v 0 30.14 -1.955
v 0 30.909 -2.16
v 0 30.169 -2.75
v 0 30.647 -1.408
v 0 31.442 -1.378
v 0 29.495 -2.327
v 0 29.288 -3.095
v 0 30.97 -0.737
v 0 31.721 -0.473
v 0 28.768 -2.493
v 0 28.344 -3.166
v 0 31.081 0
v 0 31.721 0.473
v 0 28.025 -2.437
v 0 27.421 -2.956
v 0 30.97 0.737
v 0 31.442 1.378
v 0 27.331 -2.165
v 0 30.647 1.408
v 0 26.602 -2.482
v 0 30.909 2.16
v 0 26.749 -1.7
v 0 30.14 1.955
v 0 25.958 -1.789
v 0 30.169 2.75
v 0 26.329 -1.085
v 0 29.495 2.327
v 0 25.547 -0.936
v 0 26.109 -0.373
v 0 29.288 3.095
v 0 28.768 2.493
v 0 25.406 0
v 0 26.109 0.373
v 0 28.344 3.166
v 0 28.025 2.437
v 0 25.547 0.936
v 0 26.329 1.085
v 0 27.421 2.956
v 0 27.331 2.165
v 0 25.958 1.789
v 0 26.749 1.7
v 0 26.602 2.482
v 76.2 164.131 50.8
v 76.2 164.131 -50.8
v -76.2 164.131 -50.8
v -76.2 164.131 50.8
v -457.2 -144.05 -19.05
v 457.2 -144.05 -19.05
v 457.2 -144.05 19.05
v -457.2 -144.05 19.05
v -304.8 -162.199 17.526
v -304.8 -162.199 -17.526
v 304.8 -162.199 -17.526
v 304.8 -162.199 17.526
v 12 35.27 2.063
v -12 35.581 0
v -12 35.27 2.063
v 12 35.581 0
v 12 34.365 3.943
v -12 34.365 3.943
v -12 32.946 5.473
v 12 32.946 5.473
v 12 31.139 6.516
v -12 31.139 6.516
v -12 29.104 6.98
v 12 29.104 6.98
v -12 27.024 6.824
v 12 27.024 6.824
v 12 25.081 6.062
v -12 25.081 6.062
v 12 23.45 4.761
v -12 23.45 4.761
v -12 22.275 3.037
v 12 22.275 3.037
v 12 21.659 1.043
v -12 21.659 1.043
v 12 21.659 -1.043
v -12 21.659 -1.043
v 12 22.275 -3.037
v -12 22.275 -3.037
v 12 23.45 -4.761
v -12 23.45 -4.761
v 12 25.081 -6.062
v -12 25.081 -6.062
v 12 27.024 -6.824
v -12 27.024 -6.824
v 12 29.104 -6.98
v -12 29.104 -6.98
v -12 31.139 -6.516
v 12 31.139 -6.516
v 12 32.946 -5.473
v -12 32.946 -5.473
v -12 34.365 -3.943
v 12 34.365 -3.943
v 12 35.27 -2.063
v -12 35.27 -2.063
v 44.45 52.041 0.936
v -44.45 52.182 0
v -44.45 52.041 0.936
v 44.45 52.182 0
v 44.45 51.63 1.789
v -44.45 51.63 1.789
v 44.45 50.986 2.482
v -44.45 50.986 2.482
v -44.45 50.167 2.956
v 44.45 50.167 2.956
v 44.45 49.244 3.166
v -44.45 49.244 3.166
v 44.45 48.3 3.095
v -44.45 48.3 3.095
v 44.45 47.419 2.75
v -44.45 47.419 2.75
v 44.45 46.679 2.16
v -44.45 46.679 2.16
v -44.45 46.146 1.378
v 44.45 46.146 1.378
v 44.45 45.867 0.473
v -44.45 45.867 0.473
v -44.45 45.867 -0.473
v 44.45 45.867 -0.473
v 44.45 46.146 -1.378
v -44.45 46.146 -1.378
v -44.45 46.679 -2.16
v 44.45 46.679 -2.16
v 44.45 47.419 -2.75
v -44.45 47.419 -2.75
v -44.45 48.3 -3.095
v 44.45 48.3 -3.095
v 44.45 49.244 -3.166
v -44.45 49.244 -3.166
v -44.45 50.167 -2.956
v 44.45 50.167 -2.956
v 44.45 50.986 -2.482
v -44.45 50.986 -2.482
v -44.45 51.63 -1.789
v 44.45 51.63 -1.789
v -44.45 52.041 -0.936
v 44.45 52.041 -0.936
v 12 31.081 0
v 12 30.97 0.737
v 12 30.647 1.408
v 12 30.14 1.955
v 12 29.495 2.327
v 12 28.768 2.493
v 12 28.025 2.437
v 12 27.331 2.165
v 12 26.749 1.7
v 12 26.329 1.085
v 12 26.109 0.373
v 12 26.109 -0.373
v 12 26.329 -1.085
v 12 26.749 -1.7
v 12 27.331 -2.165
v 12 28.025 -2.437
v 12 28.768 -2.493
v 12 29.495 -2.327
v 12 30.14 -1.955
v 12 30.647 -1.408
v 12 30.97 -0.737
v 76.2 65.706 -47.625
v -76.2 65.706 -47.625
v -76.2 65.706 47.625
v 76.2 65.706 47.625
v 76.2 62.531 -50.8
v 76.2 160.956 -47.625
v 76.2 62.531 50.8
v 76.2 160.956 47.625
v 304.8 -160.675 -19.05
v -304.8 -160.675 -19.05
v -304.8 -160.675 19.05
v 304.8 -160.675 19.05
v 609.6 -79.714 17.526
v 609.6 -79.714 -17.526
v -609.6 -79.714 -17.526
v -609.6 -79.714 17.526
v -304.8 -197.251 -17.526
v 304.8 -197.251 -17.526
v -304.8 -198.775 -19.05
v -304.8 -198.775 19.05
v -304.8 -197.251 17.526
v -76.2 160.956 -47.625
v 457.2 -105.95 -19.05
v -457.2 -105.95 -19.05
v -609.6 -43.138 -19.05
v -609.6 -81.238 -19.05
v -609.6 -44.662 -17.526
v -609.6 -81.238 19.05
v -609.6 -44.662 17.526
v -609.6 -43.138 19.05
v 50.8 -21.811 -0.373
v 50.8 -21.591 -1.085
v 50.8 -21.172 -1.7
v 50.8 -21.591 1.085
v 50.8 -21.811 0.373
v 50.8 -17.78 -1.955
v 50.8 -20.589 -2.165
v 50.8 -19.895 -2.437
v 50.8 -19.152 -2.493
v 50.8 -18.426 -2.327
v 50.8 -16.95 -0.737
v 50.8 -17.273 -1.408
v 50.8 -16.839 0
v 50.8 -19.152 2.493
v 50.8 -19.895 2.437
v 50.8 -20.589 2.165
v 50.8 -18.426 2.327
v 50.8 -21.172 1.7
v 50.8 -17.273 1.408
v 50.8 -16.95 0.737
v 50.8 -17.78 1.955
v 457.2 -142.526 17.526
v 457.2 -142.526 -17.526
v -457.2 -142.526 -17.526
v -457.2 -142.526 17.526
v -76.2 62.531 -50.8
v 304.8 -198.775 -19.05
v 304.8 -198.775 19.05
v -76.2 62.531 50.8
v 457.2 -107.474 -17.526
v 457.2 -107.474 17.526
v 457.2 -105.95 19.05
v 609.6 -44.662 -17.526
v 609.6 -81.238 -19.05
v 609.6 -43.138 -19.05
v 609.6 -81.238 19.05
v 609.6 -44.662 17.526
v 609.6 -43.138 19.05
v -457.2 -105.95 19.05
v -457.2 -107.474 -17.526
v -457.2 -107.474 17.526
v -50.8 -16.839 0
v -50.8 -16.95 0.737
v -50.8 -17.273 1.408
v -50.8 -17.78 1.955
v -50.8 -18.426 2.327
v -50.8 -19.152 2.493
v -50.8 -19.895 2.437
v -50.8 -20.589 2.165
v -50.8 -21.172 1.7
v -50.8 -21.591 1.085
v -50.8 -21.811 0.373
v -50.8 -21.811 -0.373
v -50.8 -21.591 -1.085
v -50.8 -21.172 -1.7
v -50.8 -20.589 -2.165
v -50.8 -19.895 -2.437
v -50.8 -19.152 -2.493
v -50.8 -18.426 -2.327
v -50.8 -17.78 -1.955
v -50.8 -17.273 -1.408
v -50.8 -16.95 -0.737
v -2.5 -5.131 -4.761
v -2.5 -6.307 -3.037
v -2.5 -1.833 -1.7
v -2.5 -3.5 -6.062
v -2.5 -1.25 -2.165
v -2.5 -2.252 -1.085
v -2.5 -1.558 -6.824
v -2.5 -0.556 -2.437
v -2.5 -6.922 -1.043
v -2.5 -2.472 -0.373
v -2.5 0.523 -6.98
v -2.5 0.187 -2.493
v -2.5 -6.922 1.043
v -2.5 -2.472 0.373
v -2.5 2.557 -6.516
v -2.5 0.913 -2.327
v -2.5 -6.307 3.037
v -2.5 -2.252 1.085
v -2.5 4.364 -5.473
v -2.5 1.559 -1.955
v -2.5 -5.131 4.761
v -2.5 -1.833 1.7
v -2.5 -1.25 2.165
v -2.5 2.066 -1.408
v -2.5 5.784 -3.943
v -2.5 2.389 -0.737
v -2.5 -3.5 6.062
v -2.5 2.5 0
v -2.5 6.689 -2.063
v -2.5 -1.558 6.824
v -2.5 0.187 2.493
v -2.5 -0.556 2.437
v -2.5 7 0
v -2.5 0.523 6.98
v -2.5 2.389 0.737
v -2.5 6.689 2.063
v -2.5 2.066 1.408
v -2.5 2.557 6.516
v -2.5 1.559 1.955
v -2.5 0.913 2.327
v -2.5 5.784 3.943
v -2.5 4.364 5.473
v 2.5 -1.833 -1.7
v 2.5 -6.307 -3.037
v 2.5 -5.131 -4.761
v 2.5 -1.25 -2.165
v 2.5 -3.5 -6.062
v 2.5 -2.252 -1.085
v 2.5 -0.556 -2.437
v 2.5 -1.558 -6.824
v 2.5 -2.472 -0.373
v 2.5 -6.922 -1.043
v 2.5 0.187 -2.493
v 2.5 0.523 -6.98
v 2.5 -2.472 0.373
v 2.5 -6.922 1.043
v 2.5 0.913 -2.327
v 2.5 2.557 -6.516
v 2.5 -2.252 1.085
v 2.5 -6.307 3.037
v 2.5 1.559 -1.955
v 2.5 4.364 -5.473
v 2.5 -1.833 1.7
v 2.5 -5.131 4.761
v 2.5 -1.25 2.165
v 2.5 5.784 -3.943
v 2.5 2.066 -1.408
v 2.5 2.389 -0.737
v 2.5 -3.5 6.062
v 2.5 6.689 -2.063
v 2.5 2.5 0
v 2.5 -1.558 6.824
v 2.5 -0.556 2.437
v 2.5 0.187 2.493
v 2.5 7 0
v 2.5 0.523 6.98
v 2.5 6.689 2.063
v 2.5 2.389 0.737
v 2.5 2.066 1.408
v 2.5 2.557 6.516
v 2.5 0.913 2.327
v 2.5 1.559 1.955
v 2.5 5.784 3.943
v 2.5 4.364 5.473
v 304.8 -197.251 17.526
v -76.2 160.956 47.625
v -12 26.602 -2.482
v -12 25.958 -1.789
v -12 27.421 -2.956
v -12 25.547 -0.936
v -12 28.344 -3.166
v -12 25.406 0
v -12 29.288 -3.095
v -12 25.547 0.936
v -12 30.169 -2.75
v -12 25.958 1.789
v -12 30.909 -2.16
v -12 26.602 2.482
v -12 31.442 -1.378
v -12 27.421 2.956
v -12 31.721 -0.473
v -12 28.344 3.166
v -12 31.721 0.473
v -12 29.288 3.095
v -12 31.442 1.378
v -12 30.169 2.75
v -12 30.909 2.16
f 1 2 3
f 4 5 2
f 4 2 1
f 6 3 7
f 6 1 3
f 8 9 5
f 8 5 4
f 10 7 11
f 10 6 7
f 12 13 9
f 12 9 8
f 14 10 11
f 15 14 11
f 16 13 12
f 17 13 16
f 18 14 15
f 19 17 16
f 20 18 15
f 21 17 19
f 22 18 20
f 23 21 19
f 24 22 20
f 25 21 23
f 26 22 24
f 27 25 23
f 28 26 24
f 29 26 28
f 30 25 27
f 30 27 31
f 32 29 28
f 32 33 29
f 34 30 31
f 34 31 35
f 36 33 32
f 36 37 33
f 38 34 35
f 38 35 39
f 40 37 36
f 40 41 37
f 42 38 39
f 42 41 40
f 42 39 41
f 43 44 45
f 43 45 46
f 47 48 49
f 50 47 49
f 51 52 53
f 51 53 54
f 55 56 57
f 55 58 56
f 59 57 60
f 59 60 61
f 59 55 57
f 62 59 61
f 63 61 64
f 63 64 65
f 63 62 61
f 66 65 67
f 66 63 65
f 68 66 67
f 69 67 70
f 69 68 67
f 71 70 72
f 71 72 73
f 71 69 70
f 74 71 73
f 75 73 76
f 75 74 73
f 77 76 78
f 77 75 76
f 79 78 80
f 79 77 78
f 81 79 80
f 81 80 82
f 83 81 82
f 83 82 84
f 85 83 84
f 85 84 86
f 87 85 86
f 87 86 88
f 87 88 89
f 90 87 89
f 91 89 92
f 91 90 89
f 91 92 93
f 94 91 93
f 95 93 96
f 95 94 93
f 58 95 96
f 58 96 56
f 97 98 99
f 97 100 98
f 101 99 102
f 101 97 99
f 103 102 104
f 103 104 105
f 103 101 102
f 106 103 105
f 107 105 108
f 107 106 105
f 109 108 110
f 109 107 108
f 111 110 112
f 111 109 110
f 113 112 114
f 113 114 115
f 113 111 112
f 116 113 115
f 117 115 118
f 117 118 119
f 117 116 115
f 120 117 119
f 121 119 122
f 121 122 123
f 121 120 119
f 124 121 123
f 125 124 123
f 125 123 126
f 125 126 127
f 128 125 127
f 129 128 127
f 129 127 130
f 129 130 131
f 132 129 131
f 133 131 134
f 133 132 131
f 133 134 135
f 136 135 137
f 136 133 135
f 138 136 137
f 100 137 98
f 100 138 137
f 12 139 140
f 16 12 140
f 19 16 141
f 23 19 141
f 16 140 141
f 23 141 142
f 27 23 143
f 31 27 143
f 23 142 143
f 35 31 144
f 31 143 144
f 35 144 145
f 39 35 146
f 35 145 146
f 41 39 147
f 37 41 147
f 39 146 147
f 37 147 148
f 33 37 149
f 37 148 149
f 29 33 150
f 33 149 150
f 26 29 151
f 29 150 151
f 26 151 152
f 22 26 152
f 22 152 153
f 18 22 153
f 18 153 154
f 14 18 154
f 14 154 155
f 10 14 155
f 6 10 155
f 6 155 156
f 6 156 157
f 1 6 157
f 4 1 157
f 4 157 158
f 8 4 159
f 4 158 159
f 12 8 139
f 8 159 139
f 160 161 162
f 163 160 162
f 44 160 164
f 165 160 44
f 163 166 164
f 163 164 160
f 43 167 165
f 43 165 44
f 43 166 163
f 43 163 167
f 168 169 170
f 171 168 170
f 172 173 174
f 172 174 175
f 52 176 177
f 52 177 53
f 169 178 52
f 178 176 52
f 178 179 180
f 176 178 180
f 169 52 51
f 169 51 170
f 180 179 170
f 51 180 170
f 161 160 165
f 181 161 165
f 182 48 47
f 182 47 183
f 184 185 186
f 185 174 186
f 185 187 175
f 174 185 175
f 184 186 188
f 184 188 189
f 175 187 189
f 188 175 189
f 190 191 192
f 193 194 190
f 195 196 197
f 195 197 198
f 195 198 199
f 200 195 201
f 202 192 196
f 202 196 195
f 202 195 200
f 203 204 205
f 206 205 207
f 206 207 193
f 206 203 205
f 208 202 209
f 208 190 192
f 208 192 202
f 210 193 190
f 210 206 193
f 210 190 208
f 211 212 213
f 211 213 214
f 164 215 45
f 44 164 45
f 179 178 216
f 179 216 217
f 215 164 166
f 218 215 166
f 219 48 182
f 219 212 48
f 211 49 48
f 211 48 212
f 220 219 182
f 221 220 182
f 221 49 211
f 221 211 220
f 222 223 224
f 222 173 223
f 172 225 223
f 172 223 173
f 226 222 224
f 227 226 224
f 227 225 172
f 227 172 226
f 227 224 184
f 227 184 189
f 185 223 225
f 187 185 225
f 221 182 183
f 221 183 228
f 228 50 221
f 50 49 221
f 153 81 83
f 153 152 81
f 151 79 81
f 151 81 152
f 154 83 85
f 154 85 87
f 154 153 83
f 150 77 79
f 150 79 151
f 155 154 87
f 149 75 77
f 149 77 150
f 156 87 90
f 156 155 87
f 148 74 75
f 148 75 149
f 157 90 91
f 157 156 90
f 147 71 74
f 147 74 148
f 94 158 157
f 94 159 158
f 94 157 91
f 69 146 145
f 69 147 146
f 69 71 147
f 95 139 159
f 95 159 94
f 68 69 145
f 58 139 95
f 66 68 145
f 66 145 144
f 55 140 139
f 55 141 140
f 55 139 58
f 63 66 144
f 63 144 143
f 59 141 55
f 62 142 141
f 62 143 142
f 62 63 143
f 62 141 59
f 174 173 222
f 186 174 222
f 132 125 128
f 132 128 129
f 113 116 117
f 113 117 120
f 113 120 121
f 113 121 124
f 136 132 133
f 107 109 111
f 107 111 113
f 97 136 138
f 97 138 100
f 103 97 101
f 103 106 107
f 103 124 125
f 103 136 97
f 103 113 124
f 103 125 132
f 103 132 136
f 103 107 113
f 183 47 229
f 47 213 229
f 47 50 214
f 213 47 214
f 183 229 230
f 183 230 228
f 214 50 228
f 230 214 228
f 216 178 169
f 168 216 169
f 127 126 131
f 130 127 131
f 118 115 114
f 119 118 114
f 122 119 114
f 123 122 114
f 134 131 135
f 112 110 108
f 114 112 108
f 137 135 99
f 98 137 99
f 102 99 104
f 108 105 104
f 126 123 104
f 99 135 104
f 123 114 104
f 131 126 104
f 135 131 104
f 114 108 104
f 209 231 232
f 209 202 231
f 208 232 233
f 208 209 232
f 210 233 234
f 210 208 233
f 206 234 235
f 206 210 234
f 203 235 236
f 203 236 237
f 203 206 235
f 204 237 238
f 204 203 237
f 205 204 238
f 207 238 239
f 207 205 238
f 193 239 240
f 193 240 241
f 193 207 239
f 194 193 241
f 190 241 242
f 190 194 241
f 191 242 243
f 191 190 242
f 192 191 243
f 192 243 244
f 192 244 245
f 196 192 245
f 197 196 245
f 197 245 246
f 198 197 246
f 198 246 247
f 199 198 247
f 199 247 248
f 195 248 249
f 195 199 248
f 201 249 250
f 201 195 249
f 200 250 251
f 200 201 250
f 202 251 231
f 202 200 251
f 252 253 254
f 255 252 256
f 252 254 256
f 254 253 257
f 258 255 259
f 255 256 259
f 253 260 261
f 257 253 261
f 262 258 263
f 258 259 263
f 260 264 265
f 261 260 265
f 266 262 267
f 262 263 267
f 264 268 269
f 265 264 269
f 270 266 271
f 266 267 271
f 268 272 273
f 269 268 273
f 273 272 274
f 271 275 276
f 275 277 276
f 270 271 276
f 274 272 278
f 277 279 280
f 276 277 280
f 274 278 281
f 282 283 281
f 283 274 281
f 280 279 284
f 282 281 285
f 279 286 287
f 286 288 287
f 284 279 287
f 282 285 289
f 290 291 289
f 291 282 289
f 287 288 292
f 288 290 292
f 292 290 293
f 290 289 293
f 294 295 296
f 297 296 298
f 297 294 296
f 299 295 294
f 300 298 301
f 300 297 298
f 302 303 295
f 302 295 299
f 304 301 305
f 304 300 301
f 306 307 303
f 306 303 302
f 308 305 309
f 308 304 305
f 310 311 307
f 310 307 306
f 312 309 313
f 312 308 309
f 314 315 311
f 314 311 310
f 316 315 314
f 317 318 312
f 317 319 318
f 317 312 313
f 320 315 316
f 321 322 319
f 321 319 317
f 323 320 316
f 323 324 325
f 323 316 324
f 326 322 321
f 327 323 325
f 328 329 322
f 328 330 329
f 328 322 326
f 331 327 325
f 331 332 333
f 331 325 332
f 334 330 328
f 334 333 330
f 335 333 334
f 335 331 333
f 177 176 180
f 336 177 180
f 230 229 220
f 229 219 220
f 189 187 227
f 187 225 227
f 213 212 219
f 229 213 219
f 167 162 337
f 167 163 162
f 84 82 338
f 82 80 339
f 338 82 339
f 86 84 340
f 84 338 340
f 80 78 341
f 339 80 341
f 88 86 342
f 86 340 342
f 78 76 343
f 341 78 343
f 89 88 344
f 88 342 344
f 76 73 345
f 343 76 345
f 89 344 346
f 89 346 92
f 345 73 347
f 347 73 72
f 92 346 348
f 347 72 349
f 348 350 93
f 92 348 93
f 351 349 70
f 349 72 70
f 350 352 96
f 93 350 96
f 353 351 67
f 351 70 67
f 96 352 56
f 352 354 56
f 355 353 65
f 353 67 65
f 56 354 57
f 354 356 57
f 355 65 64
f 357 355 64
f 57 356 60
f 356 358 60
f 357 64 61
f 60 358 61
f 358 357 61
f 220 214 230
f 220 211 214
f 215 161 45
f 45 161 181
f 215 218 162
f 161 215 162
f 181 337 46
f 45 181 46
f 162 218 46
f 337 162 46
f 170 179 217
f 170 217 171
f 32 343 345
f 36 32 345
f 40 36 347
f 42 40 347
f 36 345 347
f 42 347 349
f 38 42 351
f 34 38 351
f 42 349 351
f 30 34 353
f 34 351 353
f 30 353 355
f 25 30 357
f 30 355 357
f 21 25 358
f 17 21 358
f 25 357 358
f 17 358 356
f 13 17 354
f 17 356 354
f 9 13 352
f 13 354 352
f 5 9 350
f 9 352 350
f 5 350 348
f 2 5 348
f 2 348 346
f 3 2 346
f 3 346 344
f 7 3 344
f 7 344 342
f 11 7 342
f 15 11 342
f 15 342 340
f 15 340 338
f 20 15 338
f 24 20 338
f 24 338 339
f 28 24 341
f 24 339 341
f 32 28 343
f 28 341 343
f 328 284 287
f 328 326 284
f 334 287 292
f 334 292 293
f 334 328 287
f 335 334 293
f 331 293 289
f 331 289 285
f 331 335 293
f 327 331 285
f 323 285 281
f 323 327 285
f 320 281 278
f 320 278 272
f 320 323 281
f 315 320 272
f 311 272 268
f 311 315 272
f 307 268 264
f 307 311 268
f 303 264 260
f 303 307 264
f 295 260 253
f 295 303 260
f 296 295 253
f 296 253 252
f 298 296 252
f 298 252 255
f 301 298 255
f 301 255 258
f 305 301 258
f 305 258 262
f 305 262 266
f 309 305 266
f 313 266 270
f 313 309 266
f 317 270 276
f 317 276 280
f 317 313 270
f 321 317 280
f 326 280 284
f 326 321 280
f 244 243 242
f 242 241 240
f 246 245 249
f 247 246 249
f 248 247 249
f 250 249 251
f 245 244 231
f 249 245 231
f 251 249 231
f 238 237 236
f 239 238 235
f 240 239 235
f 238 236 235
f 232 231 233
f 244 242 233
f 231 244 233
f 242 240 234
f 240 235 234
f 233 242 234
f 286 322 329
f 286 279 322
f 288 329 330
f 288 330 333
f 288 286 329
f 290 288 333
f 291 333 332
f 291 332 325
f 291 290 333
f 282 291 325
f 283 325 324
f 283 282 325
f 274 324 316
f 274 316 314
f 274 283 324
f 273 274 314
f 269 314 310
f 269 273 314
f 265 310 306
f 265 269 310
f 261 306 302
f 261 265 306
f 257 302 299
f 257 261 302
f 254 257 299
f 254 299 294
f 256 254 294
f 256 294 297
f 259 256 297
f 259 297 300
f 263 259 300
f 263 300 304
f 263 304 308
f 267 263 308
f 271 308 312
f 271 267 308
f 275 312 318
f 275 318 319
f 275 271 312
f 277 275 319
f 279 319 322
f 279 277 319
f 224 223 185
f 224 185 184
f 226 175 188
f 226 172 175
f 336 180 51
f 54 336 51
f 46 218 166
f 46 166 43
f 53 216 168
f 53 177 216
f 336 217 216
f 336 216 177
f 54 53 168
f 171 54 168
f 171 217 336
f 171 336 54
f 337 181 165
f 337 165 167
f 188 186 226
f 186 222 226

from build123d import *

# Parameters (mm, degrees)
F0_W      = 38.1
F0_H      = 38.1
F0_W_2    = 35.052
F0_H_2    = 35.052
F3_DEPTH  = 609.6
F2_R      = 2.5
F4_DEPTH  = 50.8
F1_R      = 7
F1_R_2    = 2.5
F5_DEPTH  = 2.5
F6_DEPTH  = 457.2
F7_DEPTH  = 304.8
F8_R      = 7
F9_DEPTH  = 12
F10_R     = 2.5
F11_DEPTH = 12
F12_R     = 3.175
F13_DEPTH = 12
F14_R     = 3.175
F15_DEPTH = 44.45
F16_W     = 101.6
F16_H     = 101.6
F16_W_2   = 95.25
F16_H_2   = 95.25
F17_DEPTH = 76.2


with BuildPart() as f3:
    # F0 (on Right) → F3 (new body, symmetric)
    with BuildSketch(Plane.YZ):
        with Locations((-62.187869, 0)):
            Rectangle(F0_W, F0_H)
        with Locations((-62.187869, 0)):
            Rectangle(F0_W_2, F0_H_2, mode=Mode.SUBTRACT)
    extrude(amount=F3_DEPTH, both=True)


with BuildPart() as f4:
    # F2 (on Right) → F4 (new body, symmetric)
    with BuildSketch(Plane.YZ):
        with Locations((-19.33891, 0)):
            Circle(F2_R)
    extrude(amount=F4_DEPTH, both=True)


with BuildPart() as f5:
    # F1 (on Right) → F5 (new body, symmetric)
    with BuildSketch(Plane.YZ):
        Circle(F1_R)
        Circle(F1_R_2, mode=Mode.SUBTRACT)
    extrude(amount=F5_DEPTH, both=True)


with BuildPart() as f6:
    # F0 (on Right) → F6 (new body, symmetric)
    with BuildSketch(Plane.YZ):
        with Locations((-125.000015, 0)):
            Rectangle(F0_W, F0_H)
        with Locations((-125.000015, 0)):
            Rectangle(F0_W_2, F0_H_2, mode=Mode.SUBTRACT)
    extrude(amount=F6_DEPTH, both=True)


with BuildPart() as f7:
    # F0 (on Right) → F7 (new body, symmetric)
    with BuildSketch(Plane.YZ):
        with Locations((-179.725468, 0)):
            Rectangle(F0_W, F0_H)
        with Locations((-179.725468, 0)):
            Rectangle(F0_W_2, F0_H_2, mode=Mode.SUBTRACT)
    extrude(amount=F7_DEPTH, both=True)


with BuildPart() as f9:
    # F8 (on Right) → F9 (new body, symmetric)
    with BuildSketch(Plane.YZ):
        with Locations((28.581314, 0)):
            Circle(F8_R)
    extrude(amount=F9_DEPTH, both=True)

    # F10 (on face) → F11 (cut)
    with BuildSketch(Plane.YZ.offset(12)):
        with Locations((28.581314, 0)):
            Circle(F10_R)
    extrude(amount=-F11_DEPTH, mode=Mode.SUBTRACT)

    # F12 (on face) → F13 (cut)
    with BuildSketch(Plane(origin=(-12, 0, 0), x_dir=(0, -1, 0), z_dir=(-1, 0, 0))):
        with Locations((-28.581314, 0)):
            Circle(F12_R)
    extrude(amount=-F13_DEPTH, mode=Mode.SUBTRACT)


with BuildPart() as f15:
    # F14 (on Right) → F15 (new body, symmetric)
    with BuildSketch(Plane.YZ):
        with Locations((49.006656, 0)):
            Circle(F14_R)
    extrude(amount=F15_DEPTH, both=True)


with BuildPart() as f17:
    # F16 (on Right) → F17 (new body, symmetric)
    with BuildSketch(Plane.YZ):
        with Locations((113.331243, 0)):
            Rectangle(F16_W, F16_H)
        with Locations((113.331243, 0)):
            Rectangle(F16_W_2, F16_H_2, mode=Mode.SUBTRACT)
    extrude(amount=F17_DEPTH, both=True)


solid = Compound([f3.part, f4.part, f5.part, f6.part, f7.part, f9.part, f15.part, f17.part])
